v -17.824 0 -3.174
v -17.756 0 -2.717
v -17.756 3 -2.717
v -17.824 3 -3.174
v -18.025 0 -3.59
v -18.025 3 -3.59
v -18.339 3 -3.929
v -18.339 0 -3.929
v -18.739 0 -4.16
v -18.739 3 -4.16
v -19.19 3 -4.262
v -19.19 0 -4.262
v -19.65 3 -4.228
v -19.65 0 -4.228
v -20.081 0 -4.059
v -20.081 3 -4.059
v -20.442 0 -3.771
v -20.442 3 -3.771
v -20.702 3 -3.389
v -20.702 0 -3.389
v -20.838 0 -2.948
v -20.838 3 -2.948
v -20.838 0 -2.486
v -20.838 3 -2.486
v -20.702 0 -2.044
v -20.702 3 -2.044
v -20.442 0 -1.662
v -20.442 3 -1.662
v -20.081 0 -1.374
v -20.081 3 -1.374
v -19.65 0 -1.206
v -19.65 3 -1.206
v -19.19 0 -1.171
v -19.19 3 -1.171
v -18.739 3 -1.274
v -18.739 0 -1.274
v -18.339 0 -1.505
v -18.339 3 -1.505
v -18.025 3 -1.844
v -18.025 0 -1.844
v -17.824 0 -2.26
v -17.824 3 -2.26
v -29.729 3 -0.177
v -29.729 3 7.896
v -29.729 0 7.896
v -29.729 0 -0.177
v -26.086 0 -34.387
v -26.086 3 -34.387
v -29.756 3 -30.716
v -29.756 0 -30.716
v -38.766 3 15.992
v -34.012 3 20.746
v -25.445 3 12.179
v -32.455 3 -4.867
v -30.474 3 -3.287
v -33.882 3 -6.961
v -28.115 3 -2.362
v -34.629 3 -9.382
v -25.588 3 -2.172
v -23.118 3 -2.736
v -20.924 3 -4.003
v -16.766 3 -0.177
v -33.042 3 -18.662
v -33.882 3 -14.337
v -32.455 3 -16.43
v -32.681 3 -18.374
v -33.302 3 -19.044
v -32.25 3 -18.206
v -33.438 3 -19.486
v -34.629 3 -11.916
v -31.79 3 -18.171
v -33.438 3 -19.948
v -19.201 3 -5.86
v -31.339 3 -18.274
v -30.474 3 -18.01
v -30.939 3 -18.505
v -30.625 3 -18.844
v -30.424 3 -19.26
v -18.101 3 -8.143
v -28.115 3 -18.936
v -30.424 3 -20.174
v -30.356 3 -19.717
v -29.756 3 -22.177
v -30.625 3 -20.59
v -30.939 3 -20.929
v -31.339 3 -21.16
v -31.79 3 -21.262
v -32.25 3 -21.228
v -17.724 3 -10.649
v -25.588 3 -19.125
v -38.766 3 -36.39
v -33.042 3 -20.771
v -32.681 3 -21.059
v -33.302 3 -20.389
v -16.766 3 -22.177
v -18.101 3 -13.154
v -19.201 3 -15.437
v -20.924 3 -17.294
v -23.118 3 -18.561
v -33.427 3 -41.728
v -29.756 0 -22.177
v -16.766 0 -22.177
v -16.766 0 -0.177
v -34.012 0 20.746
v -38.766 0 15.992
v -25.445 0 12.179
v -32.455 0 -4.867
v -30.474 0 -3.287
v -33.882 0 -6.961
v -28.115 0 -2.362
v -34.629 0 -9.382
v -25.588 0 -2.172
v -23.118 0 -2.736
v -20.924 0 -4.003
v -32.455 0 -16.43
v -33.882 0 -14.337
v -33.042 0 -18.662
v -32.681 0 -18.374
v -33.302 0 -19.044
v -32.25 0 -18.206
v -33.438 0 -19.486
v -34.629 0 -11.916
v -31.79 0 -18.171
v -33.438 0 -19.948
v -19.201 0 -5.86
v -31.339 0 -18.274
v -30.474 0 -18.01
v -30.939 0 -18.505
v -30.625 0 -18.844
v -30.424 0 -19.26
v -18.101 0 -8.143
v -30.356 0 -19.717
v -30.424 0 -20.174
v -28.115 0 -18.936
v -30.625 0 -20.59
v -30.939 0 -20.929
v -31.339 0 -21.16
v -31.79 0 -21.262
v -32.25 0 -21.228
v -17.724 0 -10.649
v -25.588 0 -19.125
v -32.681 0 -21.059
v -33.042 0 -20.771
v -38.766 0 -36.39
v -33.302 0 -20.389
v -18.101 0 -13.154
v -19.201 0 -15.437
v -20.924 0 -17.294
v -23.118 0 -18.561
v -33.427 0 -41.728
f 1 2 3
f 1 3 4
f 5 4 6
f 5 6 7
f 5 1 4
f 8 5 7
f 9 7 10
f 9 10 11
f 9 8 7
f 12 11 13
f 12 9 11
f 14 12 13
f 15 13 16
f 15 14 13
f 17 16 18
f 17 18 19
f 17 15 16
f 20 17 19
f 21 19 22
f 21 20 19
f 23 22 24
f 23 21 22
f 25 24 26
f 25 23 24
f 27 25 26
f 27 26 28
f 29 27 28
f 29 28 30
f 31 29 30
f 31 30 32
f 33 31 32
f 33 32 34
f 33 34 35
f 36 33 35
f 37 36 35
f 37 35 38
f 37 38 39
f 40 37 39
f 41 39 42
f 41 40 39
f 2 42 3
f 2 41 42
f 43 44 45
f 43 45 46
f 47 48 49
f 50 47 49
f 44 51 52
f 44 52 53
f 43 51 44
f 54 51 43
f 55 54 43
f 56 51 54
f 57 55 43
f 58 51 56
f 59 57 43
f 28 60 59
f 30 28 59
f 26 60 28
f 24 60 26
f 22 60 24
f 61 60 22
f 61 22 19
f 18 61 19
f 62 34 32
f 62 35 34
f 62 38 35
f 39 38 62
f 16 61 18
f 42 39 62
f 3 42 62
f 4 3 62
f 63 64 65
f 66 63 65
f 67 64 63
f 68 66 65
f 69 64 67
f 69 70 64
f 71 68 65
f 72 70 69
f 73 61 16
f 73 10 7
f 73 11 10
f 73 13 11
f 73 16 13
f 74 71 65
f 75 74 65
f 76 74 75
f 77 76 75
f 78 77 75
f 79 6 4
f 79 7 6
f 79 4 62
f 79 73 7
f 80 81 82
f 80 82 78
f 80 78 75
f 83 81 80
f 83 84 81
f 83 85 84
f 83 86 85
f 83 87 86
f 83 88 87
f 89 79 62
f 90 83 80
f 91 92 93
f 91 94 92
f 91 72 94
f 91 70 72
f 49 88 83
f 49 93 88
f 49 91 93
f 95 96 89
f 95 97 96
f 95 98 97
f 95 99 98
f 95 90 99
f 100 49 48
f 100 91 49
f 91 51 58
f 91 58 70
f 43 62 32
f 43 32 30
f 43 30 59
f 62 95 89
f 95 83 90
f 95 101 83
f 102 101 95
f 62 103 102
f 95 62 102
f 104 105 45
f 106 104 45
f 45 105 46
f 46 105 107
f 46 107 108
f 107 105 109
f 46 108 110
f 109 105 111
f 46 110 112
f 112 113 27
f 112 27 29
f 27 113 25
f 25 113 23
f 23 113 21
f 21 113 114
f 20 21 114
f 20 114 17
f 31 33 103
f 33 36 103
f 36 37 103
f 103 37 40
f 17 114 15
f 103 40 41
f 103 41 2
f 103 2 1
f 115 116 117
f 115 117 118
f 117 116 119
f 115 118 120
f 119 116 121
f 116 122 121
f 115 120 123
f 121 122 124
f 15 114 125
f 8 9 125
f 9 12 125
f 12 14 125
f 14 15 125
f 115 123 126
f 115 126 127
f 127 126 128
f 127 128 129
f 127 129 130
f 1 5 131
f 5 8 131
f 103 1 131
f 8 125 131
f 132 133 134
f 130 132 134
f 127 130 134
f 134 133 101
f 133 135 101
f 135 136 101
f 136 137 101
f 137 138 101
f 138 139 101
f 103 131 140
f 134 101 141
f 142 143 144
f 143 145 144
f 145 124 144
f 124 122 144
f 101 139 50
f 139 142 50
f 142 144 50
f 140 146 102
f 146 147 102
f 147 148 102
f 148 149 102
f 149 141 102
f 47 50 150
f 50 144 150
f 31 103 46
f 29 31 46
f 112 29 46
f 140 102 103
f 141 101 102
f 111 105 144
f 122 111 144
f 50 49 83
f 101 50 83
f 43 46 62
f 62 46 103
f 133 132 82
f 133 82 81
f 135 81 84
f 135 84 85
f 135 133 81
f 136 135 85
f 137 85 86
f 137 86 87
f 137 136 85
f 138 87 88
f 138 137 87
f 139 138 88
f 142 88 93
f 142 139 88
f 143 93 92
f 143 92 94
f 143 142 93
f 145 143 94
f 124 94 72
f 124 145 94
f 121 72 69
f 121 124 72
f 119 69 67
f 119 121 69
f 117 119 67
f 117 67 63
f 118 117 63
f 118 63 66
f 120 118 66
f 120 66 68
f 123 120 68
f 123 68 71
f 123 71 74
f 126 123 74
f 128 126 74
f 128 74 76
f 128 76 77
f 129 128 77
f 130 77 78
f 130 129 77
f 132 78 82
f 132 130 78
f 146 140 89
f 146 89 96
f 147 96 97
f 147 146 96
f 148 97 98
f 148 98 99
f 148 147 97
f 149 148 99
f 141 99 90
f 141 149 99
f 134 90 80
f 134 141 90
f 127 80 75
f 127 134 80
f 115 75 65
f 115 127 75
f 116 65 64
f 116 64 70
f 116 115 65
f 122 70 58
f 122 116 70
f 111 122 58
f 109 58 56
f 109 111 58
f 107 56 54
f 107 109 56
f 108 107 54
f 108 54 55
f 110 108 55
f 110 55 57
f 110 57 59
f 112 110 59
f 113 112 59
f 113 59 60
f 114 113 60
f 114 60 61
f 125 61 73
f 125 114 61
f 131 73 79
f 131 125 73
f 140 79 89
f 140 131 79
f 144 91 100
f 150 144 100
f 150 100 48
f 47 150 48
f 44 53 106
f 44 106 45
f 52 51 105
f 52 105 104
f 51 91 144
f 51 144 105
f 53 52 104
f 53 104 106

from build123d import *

# Parameters (mm, degrees)
SKETCH1_W           = 22
SKETCH1_H           = 22
SKETCH1_R           = 1.55
SKETCH1_R_2         = 8.5
BOSS_EXTRUDE1_DEPTH = 3
BOSS_EXTRUDE2_DEPTH = 3


with BuildPart() as part:
    # Sketch1 → Boss-Extrude1 (new body)
    with BuildSketch(Plane(origin=(0, 0, 0), x_dir=(1, 0, 0), z_dir=(0, 1, 0))):
        with Locations((-27.765585807, 11.176708998)):
            Rectangle(SKETCH1_W, SKETCH1_H)
        with Locations((-19.305585807, 2.716708998)):
            Circle(SKETCH1_R, mode=Mode.SUBTRACT)
        with Locations((-31.905585807, 19.716708998)):
            Circle(SKETCH1_R, mode=Mode.SUBTRACT)
        with Locations((-26.223701498, 10.648645815)):
            Circle(SKETCH1_R_2, mode=Mode.SUBTRACT)
    extrude(amount=BOSS_EXTRUDE1_DEPTH)

    # Sketch2 → Boss-Extrude2 (add)
    with BuildSketch(Plane(origin=(0, 3, 0), x_dir=(1, 0, 0), z_dir=(0, 1, 0))):
        Polygon((-38.765585807, 0.176708998), (-38.765585807, -15.991830681), (-34.011681836, -20.745734651), (-25.445380771, -12.179433585), (-29.728531303, -7.896283053), (-29.728531303, 0.176708998), align=None)
        Polygon((-38.765585807, 22.176708998), (-38.765585807, 36.389702532), (-33.427082463, 41.728205876), (-26.085708647, 34.38683206), (-29.756395555, 30.716145153), (-29.756395555, 22.176708998), align=None)
    extrude(amount=-BOSS_EXTRUDE2_DEPTH)


solid = part.part
